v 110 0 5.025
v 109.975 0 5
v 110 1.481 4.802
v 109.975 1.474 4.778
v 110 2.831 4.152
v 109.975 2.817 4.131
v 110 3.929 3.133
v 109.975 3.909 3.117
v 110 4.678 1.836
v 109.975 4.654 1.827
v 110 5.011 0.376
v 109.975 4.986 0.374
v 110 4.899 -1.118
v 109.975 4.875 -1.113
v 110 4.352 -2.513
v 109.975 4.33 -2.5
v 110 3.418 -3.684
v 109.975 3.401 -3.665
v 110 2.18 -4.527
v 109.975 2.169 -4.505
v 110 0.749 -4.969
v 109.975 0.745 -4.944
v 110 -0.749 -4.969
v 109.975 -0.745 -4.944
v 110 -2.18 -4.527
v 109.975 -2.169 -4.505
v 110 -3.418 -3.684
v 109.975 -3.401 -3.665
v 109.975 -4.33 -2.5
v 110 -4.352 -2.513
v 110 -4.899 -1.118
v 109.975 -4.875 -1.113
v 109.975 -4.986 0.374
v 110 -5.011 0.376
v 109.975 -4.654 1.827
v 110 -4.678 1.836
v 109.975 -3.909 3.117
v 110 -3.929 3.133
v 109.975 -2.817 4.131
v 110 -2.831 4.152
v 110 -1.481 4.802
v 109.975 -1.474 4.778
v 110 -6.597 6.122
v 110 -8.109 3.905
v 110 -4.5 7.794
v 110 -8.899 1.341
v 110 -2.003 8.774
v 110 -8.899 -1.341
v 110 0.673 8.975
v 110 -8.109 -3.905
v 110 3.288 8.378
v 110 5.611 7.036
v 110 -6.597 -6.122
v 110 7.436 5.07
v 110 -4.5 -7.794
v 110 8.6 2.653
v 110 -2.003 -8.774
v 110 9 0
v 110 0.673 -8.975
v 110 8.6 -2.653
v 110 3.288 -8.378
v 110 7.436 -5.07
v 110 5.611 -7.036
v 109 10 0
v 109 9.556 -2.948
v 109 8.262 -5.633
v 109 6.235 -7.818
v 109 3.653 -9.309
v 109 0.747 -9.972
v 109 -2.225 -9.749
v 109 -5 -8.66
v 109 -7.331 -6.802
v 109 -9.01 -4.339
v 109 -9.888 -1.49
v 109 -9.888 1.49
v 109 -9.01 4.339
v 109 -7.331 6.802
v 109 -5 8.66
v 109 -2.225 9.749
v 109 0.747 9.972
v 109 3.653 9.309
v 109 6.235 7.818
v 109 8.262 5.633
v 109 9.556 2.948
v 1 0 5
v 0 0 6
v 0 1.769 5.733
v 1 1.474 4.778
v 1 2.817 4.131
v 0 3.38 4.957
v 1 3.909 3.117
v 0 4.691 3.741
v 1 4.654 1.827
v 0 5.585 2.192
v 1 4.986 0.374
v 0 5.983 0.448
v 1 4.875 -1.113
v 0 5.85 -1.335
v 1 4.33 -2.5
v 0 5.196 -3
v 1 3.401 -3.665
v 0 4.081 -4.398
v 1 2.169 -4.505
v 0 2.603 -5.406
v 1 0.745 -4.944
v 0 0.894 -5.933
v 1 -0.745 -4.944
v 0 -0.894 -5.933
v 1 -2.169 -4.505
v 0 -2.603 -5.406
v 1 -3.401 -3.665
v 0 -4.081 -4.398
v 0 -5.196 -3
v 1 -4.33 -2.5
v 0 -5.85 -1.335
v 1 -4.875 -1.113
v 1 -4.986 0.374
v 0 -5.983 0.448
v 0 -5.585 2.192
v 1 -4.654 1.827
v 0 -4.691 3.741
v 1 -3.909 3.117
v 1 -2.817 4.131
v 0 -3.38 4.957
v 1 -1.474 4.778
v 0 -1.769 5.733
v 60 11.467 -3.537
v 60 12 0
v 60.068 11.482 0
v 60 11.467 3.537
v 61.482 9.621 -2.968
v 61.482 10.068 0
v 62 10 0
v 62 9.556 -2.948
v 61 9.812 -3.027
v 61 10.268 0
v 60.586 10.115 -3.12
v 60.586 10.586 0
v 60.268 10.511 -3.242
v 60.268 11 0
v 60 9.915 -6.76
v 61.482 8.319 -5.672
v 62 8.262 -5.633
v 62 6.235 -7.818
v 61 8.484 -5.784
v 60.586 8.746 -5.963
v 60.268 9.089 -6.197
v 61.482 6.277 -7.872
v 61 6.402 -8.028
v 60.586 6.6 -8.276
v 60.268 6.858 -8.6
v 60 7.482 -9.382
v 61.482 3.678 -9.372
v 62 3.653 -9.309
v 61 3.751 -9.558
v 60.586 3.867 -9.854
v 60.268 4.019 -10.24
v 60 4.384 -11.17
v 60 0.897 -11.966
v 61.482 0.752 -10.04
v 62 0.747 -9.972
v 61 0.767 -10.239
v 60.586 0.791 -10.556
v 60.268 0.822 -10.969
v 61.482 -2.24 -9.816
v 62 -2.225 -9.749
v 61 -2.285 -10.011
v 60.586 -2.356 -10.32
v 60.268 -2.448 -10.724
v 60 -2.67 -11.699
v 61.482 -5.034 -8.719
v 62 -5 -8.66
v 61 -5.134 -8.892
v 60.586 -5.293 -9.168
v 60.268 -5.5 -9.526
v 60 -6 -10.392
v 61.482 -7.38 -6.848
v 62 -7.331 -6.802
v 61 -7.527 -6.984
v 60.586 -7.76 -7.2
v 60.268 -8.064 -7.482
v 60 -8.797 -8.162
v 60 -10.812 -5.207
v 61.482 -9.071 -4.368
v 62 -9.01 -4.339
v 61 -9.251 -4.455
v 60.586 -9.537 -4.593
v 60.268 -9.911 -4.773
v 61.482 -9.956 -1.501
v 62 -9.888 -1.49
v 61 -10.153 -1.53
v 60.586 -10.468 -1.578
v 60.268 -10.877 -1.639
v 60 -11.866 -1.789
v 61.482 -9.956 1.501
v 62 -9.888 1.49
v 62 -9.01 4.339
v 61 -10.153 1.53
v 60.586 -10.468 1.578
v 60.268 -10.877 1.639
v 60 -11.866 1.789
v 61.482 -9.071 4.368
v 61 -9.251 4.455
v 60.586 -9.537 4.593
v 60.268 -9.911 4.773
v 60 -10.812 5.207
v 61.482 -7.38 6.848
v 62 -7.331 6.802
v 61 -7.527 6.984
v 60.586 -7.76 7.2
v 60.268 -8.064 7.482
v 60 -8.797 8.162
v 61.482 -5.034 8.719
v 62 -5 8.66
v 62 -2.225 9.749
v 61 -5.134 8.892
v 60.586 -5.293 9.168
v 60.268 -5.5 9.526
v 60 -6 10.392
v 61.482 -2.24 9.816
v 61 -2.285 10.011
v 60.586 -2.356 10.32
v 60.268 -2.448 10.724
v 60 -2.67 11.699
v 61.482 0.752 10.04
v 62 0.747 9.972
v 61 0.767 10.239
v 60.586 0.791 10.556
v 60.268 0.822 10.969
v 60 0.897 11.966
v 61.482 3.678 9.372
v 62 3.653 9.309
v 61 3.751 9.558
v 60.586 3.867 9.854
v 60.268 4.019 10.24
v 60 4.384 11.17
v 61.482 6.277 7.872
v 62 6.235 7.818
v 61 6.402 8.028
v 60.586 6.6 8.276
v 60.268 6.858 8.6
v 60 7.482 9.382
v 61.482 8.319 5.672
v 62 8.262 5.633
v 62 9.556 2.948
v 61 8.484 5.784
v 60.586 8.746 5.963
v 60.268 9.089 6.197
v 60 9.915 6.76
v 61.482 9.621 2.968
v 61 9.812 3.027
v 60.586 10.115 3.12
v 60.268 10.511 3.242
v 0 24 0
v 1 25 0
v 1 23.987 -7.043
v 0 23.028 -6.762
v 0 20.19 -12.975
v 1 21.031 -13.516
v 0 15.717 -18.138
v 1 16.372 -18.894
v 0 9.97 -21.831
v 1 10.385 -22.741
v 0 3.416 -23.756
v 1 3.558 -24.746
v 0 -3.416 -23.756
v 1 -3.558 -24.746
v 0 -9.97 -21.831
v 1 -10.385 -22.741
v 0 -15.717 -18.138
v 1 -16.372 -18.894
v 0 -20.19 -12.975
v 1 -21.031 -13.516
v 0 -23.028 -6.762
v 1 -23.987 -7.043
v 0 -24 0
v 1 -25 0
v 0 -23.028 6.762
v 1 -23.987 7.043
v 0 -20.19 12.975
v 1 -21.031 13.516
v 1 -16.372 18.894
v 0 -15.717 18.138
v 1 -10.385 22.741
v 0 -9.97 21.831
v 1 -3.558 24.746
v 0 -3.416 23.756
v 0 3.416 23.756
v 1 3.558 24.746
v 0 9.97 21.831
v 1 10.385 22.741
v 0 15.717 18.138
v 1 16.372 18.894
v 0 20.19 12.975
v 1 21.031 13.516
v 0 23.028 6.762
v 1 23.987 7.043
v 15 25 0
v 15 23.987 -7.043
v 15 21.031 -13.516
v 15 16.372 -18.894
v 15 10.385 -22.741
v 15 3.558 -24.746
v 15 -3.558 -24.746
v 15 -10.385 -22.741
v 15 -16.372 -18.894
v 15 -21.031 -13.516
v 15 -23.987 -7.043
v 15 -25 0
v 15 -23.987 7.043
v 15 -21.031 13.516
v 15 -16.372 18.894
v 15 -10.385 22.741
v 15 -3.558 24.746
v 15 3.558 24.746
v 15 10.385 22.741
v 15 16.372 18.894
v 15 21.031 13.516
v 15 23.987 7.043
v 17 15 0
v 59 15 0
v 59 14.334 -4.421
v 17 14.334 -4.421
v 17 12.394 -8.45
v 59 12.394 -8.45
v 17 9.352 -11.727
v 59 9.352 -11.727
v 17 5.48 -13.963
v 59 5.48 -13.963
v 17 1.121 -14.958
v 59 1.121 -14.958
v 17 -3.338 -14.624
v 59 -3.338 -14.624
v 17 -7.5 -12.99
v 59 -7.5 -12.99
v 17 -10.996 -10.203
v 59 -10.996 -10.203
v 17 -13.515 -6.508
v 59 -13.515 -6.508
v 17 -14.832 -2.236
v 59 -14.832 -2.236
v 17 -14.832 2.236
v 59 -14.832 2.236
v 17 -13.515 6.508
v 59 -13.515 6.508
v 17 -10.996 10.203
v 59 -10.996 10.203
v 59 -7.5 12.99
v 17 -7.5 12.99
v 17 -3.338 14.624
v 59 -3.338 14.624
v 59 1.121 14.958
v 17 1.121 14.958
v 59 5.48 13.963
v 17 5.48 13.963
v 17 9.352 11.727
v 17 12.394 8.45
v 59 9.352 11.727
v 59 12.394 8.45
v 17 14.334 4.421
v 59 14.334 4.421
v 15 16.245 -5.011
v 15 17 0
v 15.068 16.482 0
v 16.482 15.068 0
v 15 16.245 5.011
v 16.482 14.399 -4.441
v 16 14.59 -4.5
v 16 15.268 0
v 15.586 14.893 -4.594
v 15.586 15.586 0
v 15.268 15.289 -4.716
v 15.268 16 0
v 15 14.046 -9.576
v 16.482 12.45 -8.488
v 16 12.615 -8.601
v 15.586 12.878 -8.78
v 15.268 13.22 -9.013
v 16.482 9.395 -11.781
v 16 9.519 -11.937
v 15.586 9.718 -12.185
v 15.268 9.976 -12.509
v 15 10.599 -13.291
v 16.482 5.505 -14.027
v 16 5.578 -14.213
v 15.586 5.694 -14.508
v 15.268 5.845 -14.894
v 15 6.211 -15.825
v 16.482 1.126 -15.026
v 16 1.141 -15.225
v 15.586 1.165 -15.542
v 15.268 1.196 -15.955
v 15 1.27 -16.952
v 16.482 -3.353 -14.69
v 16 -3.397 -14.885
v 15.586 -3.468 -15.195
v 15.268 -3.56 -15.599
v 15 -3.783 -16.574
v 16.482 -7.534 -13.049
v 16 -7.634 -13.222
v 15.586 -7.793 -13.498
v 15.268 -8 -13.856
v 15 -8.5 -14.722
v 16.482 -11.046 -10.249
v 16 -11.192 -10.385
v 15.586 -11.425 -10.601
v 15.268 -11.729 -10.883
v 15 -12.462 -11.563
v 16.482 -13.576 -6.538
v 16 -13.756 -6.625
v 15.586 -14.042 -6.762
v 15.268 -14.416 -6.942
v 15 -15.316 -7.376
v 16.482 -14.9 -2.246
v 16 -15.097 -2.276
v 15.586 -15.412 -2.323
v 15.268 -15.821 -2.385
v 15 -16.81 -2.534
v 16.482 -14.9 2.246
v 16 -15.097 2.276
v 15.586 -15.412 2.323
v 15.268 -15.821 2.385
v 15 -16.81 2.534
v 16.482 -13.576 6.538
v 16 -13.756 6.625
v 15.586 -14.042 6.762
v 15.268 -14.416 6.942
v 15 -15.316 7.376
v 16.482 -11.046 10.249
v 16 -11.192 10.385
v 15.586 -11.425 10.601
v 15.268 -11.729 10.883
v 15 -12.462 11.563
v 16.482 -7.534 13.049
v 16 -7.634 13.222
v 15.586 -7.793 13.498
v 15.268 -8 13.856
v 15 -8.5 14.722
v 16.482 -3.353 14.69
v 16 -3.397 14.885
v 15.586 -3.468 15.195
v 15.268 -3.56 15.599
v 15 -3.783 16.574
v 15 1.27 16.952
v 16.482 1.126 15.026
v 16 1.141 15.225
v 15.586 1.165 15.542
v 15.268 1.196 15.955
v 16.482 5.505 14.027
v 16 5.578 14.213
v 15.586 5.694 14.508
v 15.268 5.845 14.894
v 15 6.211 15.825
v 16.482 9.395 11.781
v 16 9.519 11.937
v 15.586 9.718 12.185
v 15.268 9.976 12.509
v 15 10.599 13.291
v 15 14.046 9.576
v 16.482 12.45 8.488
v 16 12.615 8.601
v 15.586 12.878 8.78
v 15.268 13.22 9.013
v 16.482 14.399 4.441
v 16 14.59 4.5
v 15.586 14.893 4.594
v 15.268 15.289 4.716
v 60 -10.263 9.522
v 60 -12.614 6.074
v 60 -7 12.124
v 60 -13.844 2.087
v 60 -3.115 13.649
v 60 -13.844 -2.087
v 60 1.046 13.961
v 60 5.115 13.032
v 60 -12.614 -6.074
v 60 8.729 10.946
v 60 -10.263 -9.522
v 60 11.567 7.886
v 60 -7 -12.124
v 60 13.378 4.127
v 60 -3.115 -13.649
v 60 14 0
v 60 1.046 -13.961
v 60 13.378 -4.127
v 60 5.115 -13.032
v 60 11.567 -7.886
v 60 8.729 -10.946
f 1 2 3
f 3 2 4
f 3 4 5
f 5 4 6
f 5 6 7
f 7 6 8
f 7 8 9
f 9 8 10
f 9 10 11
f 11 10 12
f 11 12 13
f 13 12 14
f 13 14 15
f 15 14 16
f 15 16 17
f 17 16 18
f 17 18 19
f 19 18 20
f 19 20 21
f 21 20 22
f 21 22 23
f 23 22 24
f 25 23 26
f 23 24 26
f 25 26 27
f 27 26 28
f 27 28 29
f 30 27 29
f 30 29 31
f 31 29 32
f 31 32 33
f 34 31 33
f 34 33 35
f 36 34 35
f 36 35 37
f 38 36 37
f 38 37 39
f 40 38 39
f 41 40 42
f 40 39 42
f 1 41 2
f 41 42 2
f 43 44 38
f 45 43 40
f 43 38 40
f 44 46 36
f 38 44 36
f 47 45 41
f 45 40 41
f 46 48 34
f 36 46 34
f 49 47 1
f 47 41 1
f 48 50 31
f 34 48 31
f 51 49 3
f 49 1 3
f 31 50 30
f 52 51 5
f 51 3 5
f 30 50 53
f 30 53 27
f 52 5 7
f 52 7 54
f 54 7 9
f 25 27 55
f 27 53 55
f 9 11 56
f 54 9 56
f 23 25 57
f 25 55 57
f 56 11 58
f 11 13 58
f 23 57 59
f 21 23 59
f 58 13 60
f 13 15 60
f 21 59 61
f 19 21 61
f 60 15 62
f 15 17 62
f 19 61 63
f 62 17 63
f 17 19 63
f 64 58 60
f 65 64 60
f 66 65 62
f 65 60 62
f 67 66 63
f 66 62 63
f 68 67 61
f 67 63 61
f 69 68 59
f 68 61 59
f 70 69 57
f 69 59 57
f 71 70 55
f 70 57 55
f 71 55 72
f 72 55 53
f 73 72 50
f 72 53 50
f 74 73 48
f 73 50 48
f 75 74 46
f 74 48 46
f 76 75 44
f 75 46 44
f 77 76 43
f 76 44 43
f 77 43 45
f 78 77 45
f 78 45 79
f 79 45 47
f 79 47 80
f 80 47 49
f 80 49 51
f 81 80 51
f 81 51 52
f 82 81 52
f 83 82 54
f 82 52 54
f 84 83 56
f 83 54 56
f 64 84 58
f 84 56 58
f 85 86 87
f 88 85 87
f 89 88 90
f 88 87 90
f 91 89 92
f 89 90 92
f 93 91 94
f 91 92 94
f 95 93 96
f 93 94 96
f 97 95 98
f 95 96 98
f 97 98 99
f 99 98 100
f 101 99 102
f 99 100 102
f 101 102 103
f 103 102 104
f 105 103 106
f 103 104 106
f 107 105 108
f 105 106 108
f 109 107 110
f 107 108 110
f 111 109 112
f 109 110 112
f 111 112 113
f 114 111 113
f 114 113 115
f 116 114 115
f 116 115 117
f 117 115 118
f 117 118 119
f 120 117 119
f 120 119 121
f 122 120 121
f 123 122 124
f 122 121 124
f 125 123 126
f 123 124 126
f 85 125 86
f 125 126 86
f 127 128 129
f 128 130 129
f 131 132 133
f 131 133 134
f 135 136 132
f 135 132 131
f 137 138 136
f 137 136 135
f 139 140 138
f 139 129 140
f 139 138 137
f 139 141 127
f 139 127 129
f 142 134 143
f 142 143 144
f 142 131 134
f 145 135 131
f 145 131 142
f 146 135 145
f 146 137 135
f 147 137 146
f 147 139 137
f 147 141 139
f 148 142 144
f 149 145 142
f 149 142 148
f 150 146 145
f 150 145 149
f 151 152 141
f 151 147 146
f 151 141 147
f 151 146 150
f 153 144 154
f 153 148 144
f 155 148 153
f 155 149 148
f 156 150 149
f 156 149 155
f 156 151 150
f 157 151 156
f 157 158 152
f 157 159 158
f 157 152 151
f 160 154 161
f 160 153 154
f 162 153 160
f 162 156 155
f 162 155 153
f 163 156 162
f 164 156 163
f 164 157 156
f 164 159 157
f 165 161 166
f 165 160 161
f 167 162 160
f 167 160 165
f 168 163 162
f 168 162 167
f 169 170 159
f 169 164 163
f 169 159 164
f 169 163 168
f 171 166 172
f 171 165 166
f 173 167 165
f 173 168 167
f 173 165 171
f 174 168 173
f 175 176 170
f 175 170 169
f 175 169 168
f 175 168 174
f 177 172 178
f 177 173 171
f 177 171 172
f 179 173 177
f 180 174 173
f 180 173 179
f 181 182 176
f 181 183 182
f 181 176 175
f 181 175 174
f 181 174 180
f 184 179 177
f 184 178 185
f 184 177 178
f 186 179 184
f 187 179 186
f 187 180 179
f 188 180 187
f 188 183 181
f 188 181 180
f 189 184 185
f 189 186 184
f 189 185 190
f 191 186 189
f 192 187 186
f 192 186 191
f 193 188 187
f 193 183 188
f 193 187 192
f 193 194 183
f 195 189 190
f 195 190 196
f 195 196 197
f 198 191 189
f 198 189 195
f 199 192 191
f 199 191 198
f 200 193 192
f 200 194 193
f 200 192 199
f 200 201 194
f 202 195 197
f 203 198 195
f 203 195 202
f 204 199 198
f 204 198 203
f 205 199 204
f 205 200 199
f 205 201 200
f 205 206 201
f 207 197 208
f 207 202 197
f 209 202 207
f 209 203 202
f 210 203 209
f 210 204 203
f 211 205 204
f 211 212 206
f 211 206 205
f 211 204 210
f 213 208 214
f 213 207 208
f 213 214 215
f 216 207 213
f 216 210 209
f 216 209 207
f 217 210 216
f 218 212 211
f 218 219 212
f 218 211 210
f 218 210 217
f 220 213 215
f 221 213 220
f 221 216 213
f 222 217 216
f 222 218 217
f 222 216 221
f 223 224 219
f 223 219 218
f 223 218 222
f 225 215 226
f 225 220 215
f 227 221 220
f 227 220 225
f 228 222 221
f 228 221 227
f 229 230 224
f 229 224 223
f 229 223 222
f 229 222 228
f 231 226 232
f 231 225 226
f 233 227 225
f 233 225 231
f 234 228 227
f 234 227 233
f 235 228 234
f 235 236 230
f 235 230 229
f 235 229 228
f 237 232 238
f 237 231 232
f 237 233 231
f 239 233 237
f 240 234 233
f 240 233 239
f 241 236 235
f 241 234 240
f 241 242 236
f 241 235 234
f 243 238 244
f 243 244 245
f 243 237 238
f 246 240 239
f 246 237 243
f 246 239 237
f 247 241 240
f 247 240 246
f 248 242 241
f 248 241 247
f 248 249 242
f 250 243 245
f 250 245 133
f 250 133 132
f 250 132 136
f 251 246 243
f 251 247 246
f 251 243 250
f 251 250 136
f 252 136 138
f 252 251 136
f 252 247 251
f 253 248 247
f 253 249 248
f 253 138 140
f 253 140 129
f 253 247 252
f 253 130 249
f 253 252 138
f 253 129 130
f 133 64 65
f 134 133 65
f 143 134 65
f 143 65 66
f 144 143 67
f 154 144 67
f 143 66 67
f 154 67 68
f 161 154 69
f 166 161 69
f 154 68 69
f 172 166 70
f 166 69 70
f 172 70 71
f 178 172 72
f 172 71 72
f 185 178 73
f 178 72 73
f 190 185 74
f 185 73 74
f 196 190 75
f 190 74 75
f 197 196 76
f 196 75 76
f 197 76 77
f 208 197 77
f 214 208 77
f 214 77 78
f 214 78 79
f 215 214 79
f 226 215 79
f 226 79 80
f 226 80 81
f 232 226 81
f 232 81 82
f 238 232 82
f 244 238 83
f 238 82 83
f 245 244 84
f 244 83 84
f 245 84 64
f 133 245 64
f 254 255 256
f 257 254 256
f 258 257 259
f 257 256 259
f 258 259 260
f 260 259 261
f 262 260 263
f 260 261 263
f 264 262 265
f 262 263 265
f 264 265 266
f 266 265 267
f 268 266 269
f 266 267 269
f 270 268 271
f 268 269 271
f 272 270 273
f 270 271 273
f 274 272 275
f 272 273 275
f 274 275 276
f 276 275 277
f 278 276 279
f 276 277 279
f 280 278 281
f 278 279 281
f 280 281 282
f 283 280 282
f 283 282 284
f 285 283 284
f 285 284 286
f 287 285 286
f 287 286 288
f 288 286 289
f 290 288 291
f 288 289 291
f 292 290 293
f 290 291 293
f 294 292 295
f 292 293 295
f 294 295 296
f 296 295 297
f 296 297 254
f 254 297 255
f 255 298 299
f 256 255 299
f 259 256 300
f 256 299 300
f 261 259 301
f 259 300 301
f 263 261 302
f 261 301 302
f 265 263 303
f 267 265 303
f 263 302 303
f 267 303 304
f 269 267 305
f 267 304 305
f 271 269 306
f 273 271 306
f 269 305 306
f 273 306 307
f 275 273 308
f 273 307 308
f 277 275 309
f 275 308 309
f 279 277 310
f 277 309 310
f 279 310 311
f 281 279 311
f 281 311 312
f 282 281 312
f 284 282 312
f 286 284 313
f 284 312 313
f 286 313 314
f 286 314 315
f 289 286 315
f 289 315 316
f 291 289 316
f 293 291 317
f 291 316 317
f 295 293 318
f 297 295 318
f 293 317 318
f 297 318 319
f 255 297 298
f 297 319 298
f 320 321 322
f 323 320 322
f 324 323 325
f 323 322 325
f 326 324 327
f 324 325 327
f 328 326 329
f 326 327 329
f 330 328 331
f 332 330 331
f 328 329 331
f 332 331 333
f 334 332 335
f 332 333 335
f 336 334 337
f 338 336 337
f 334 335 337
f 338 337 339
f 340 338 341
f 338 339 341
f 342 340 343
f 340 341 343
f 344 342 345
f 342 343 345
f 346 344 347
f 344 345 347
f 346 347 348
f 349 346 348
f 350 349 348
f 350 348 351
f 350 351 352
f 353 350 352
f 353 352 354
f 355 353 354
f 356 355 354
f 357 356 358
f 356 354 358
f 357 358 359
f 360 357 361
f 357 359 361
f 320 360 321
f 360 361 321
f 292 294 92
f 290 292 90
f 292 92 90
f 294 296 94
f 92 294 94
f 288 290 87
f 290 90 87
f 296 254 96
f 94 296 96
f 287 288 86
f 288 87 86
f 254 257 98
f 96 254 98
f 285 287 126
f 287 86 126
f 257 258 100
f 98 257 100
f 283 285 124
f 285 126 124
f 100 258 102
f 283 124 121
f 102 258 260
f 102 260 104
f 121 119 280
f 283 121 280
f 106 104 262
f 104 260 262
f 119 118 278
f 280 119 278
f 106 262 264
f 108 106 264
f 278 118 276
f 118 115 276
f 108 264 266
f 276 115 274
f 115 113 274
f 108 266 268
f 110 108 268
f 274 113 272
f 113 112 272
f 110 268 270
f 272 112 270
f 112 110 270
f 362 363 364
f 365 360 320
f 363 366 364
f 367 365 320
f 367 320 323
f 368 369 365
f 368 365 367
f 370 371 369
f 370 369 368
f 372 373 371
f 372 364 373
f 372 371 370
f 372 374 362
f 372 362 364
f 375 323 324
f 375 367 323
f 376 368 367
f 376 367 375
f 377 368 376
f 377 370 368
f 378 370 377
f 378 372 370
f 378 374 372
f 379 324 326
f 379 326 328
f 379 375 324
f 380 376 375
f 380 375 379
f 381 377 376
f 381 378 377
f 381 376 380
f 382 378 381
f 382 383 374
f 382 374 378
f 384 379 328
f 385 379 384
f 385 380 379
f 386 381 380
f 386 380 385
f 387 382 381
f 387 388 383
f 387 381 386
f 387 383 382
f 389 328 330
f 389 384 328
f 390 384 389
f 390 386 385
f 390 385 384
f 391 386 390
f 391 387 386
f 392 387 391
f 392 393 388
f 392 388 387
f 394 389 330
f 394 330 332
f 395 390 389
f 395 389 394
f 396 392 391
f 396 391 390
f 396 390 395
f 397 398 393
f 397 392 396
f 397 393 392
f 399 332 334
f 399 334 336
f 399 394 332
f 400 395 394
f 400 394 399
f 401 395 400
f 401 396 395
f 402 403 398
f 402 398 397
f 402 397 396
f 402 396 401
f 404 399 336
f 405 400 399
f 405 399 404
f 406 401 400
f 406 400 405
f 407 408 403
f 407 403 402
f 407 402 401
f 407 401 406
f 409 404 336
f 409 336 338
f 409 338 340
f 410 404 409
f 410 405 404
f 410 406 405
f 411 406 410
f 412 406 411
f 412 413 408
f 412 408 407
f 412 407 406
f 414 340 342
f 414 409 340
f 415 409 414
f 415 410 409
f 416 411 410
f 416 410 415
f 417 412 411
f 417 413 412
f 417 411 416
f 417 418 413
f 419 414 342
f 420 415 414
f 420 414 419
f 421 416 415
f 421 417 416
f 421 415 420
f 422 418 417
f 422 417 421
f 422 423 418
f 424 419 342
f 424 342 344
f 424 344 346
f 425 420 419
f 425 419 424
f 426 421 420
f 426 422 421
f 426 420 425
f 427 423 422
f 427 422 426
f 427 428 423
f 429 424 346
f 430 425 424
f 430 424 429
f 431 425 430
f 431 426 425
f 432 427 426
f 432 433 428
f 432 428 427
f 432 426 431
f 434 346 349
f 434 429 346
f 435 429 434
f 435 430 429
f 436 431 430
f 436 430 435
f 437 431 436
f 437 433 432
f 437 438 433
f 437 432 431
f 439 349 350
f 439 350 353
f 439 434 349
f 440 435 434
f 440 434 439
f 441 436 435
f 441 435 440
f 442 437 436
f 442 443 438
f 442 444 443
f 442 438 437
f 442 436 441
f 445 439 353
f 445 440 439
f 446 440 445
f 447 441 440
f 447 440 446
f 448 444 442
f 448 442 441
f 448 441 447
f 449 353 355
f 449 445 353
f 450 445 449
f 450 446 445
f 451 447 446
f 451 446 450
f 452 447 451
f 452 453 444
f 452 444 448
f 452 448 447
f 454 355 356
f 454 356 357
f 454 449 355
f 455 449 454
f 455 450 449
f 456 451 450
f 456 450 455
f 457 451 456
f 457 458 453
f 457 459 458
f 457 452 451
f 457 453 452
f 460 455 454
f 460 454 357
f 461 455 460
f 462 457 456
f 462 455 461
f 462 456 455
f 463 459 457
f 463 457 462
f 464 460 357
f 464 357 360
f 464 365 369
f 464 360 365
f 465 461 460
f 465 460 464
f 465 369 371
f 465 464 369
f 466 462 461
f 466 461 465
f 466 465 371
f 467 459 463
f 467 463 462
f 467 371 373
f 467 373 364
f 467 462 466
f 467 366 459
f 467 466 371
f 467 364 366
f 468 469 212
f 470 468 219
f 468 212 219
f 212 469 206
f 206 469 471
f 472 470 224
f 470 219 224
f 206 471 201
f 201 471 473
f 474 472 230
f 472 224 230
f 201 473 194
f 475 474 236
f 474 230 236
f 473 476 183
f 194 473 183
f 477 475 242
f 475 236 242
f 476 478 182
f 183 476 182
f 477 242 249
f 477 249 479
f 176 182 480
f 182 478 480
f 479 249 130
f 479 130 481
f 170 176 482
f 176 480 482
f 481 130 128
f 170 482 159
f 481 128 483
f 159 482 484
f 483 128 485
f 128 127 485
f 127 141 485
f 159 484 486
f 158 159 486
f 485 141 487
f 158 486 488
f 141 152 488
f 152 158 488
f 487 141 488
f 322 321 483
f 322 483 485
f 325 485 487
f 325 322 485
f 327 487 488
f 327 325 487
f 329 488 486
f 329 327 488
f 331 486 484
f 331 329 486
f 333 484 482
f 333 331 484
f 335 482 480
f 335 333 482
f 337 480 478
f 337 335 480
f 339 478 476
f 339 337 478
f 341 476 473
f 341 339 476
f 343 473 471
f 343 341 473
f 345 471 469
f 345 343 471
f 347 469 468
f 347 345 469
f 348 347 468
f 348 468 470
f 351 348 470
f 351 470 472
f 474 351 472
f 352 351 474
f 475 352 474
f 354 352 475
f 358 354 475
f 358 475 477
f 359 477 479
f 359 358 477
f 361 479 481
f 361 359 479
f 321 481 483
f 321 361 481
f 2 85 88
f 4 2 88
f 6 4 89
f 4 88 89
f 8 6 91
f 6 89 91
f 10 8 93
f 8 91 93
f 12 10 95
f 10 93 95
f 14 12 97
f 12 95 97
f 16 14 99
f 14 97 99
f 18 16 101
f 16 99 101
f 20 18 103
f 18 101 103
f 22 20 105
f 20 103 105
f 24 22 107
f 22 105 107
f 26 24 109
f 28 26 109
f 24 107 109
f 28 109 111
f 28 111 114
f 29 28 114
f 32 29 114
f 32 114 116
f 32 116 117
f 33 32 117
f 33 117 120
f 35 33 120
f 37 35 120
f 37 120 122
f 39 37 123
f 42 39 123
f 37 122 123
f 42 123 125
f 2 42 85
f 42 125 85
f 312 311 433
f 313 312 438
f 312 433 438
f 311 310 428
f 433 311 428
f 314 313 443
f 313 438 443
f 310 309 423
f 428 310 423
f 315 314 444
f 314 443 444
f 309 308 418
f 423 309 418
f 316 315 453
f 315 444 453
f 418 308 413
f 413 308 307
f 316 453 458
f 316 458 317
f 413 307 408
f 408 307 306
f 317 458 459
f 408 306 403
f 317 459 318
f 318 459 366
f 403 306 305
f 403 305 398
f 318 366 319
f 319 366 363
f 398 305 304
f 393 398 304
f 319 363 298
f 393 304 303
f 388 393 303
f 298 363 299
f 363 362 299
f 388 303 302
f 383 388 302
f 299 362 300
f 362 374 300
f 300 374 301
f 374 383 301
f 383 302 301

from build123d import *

# Parameters (mm, degrees)
FUROS_GUIA_COM_10_0MM1_D           = 10
FUROS_GUIA_COM_10_0MM1_CSINK_D     = 10.05
FUROS_GUIA_COM_10_0MM1_CSINK_ANGLE = 90
FILETE1_R                          = 2
CHANFRO4_SIZE                      = 1
CHANFRO6_SIZE                      = 1


with BuildPart() as part:
    # Esboço1 → Revolução1 (revolve)
    with BuildSketch(Plane.XY):
        Polygon((0, 0), (0, 25), (15, 25), (15, 15), (60, 15), (60, 10), (110, 10), (110, 0), align=None)
    revolve(axis=Axis((110, 0, 0), (-1, 0, 0)))

    # Furos-guia com Ø10.0mm1 (through all)
    with Locations(Plane(origin=(110, 0, 0), x_dir=(0, 0, -1), z_dir=(1, 0, 0))):
        with Locations((0, 0)):
            CounterSinkHole(FUROS_GUIA_COM_10_0MM1_D / 2, FUROS_GUIA_COM_10_0MM1_CSINK_D / 2, counter_sink_angle=FUROS_GUIA_COM_10_0MM1_CSINK_ANGLE)

    # Filete1
    filete1_edges = [part.edges().sort_by_distance(p)[0] for p in [
        (60, -10, 0),
        (15, -15, 0),
    ]]
    fillet(filete1_edges, radius=FILETE1_R)

    # Chanfro4
    chanfro4_edges = [part.edges().sort_by_distance(p)[0] for p in [
        (110, -10, 0),
        (60, -15, 0),
        (0, -25, 0),
    ]]
    chamfer(chanfro4_edges, length=CHANFRO4_SIZE)

    # Chanfro6
    chanfro6_edges = [part.edges().sort_by_distance(p)[0] for p in [
        (0, 0, -5),
    ]]
    chamfer(chanfro6_edges, length=CHANFRO6_SIZE)


solid = part.part
